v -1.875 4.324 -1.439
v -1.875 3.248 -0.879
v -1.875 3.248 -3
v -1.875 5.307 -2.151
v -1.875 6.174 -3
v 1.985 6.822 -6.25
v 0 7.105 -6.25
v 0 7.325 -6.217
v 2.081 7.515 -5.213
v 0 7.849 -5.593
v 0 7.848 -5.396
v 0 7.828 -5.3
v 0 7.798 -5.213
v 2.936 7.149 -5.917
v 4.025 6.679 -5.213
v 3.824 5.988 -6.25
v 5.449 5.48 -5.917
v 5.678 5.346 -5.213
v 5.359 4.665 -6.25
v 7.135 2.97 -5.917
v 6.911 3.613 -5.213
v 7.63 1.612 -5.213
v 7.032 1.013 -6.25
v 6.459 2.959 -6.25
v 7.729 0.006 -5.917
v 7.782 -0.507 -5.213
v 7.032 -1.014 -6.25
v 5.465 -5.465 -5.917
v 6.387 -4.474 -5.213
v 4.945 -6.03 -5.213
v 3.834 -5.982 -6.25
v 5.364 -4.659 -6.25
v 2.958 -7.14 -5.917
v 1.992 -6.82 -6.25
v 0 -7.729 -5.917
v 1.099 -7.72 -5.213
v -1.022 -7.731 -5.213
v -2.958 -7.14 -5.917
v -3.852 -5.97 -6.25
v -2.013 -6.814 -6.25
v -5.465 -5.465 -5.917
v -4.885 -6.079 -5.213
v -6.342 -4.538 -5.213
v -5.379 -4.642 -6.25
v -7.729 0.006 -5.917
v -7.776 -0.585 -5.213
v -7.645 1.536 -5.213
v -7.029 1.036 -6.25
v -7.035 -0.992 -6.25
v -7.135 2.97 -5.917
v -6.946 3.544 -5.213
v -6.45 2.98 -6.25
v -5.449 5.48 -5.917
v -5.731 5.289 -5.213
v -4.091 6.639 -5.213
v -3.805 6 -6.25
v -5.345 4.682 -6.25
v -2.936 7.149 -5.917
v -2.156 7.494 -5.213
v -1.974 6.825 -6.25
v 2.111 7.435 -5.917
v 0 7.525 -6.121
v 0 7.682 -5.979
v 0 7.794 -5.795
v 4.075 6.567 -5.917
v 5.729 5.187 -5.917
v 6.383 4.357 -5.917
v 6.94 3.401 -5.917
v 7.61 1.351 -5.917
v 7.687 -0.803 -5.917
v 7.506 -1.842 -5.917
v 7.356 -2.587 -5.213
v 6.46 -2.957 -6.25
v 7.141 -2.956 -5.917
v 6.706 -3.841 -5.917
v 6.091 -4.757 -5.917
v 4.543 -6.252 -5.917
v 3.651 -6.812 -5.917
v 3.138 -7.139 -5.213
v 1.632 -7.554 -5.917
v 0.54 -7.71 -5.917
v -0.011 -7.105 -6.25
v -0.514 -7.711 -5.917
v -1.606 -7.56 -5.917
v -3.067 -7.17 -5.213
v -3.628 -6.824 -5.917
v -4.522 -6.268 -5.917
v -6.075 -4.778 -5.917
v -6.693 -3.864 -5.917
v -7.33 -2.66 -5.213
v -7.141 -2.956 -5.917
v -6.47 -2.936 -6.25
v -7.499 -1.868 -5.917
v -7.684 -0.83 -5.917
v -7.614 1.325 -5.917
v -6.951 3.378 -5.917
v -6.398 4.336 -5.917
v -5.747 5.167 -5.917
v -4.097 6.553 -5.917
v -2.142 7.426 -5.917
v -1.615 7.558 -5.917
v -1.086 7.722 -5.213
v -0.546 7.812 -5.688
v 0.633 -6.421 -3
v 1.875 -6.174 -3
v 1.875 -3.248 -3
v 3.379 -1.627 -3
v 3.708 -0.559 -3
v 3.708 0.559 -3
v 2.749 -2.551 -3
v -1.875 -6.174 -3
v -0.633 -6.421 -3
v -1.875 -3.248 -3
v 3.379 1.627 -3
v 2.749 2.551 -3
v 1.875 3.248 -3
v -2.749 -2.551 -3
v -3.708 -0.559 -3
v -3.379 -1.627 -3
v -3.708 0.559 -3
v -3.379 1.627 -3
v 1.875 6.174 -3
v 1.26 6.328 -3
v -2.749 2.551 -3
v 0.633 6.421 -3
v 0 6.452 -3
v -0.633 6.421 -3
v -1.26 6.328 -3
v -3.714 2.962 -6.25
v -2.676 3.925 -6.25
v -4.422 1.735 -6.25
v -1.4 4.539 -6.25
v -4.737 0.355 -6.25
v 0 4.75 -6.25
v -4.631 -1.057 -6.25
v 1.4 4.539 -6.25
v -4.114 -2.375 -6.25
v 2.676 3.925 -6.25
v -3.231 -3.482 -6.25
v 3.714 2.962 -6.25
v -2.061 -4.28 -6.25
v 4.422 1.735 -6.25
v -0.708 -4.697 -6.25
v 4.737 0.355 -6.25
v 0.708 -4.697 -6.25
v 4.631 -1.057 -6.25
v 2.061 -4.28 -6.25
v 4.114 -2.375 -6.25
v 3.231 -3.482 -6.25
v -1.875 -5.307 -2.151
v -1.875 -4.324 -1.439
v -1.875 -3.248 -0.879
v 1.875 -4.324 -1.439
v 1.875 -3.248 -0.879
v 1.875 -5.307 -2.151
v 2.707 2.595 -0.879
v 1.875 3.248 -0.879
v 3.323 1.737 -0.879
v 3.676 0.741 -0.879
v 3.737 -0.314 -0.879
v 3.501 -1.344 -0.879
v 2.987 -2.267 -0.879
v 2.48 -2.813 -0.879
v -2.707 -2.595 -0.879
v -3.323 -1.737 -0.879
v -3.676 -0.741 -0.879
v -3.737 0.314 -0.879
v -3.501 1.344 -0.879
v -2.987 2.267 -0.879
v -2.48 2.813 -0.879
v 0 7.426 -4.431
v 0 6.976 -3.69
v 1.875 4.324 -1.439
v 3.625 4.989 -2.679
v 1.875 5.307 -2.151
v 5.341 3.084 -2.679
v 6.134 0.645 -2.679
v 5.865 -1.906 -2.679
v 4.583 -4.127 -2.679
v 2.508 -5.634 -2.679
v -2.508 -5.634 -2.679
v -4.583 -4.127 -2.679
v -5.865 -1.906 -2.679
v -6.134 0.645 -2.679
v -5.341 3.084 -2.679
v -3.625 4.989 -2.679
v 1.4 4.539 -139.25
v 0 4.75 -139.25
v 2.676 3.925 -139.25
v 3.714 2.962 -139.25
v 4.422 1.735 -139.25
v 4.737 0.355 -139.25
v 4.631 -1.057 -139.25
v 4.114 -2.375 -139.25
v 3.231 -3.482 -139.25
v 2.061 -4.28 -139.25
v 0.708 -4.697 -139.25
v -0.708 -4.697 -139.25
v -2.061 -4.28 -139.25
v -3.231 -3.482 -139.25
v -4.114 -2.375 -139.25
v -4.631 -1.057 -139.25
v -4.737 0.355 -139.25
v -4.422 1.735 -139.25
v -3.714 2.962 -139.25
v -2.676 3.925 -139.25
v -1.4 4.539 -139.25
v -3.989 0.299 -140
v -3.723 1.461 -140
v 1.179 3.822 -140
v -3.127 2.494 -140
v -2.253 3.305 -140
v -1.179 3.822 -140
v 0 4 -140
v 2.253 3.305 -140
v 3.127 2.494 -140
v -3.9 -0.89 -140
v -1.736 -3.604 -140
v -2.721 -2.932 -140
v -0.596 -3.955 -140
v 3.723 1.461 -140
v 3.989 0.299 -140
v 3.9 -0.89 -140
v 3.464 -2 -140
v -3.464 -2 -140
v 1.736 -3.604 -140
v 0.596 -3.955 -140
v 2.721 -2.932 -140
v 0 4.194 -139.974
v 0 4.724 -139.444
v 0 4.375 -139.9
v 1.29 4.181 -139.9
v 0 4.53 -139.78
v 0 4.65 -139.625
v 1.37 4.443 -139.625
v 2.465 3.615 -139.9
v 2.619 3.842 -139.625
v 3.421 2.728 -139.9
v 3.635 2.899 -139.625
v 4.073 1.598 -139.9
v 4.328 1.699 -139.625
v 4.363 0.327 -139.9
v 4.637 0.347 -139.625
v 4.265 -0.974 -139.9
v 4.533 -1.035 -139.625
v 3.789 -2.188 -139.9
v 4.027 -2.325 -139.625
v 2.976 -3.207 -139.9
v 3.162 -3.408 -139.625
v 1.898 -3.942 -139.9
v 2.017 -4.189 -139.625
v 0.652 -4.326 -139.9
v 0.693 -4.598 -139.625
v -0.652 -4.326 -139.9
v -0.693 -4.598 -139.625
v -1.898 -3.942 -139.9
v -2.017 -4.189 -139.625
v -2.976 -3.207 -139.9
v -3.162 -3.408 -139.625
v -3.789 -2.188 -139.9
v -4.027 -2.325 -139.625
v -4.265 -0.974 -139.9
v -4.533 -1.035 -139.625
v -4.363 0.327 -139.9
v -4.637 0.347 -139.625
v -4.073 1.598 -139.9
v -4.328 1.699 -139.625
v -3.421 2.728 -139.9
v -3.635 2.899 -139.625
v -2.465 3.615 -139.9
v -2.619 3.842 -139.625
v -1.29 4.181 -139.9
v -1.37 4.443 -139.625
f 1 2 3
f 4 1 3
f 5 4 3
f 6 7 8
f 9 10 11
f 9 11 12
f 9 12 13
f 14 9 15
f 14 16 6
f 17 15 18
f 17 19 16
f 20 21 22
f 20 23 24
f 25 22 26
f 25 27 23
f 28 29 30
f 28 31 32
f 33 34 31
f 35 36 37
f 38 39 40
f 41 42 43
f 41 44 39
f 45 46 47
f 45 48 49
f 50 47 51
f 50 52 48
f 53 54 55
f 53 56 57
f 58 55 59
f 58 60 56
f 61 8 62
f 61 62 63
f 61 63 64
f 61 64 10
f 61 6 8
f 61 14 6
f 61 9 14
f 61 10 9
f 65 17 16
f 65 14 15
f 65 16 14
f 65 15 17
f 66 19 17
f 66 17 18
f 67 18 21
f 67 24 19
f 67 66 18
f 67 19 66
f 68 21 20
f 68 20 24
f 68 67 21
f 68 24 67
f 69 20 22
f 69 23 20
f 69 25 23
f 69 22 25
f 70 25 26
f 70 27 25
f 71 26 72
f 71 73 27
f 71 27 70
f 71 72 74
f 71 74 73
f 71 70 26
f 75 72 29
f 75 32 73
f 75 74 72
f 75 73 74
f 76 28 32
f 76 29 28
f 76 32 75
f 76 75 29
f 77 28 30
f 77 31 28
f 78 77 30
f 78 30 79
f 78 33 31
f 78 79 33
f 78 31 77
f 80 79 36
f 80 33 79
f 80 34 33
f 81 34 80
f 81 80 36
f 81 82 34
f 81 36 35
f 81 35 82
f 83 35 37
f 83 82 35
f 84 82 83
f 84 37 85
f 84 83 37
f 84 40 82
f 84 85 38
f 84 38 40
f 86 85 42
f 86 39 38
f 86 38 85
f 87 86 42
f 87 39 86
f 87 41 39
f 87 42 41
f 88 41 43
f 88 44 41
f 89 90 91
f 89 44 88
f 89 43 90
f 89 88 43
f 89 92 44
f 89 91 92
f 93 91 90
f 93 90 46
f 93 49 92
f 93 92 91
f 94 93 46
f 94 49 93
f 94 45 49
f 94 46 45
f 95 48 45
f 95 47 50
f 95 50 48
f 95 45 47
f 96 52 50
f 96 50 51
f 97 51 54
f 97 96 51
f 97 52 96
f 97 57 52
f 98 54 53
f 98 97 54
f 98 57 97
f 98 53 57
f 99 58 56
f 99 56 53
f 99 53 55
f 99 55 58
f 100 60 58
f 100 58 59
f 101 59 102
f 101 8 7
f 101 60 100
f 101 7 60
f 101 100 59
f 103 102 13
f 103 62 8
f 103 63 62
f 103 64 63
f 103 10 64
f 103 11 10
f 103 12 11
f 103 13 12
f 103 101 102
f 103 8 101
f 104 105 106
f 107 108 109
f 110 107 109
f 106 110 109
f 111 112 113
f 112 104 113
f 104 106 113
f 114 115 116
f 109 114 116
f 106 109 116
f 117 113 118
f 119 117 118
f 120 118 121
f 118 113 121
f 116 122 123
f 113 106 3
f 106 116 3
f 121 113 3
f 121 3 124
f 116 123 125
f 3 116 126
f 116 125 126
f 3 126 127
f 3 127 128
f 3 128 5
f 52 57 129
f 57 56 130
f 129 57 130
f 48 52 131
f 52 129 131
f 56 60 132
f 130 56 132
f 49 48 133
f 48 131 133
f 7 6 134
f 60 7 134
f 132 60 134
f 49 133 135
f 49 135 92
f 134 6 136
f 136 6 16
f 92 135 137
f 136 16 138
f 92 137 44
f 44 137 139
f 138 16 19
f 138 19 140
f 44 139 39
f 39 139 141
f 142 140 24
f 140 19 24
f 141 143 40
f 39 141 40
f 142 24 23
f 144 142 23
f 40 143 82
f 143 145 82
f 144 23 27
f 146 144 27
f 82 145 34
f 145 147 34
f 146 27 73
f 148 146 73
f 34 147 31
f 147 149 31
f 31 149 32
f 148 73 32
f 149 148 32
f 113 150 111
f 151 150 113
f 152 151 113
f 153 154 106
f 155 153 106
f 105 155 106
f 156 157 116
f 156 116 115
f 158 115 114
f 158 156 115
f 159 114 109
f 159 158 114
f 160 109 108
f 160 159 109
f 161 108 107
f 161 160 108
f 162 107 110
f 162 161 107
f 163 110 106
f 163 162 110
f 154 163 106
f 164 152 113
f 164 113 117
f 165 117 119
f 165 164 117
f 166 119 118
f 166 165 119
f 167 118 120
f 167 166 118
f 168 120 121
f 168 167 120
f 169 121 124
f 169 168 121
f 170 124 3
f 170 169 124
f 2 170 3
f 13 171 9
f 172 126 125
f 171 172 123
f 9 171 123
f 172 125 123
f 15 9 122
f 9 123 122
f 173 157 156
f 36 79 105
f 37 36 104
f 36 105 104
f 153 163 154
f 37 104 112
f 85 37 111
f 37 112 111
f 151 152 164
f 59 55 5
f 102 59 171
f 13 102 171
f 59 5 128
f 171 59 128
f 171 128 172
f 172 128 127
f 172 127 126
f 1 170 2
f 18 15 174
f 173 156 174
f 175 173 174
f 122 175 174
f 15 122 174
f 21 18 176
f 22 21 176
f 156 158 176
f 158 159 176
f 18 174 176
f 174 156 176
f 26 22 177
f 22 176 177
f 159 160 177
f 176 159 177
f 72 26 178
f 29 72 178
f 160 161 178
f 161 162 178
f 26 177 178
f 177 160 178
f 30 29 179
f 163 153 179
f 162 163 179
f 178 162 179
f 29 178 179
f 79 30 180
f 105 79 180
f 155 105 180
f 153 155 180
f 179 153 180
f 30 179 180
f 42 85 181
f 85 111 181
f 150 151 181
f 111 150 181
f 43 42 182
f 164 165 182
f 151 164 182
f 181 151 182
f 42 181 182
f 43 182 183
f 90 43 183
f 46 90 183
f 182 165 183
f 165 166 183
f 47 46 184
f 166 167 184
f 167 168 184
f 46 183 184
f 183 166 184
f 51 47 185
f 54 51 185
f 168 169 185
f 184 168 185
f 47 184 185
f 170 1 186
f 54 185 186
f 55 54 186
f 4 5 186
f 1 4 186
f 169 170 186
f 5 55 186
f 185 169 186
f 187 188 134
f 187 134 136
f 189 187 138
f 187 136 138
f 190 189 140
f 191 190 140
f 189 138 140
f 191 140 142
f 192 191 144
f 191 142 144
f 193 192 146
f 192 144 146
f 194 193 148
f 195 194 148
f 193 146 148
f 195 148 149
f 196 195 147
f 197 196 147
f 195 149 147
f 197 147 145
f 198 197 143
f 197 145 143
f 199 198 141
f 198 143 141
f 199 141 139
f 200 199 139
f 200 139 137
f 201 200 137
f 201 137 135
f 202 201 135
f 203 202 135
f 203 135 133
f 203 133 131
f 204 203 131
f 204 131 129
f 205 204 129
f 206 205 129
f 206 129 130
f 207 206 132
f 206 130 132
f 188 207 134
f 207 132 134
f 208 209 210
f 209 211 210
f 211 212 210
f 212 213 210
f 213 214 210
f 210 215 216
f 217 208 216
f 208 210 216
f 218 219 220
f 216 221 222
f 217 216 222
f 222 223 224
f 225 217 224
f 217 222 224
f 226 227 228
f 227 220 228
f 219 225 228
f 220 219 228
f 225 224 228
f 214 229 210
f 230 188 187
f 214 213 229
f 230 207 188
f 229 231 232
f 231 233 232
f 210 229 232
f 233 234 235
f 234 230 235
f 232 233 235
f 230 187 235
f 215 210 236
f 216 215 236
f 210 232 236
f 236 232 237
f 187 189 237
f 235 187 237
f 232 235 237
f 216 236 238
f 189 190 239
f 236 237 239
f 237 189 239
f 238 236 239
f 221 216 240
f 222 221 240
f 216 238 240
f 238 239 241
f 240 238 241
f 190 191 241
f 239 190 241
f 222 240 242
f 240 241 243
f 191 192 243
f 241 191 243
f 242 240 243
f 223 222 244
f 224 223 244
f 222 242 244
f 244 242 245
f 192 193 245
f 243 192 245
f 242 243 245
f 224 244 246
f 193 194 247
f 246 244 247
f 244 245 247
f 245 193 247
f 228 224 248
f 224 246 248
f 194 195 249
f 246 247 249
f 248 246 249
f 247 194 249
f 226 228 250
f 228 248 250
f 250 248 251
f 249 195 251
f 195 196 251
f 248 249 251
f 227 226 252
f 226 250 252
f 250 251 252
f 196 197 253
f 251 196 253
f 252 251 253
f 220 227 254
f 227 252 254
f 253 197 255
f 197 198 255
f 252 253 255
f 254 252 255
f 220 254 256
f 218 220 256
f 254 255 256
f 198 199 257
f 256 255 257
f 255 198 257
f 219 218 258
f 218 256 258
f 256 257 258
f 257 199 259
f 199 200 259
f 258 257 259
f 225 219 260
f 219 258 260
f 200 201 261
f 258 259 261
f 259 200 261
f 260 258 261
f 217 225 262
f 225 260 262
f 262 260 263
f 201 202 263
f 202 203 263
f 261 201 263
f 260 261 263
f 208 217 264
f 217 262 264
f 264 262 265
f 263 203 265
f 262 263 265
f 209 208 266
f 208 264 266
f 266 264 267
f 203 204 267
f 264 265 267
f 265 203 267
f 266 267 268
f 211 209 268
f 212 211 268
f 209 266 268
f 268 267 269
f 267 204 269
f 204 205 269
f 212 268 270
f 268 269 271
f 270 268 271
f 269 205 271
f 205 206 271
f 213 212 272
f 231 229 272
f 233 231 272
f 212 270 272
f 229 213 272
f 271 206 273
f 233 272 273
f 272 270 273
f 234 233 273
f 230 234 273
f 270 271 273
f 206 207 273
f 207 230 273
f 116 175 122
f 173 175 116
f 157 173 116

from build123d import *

# Parameters (mm, degrees)
FILLET1_R          = 0.75
CUT_EXTRUDE6_DEPTH = 3


with BuildPart() as part:
    # Sketch1 → Revolve1 (revolve)
    with BuildSketch(Plane(origin=(0, 0, 0), x_dir=(0, 0, -1), z_dir=(1, 0, 0))):
        with BuildLine():
            Line((0, 0), (140, 0))
            Line((140, 0), (140, 4.75))
            Line((140, 4.75), (6.25, 4.75))
            Line((6.25, 4.75), (6.25, 8.15))
            ThreePointArc((6.25, 8.15), (1.742375921, 5.135294539), (0, 0))
        make_face()
    revolve(axis=Axis((0, 0, 0), (0, 0, -1)))

    # Fillet1
    fillet1_edges = [part.edges().sort_by_distance(p)[0] for p in [
        (0, -8.15, -6.25),
        (0, -4.75, -140),
    ]]
    fillet(fillet1_edges, radius=FILLET1_R)

    # Sketch4 → Cut-Extrude6 (cut)
    with BuildSketch(Plane.XY):
        with BuildLine():
            Line((1.875, -3.247595264), (1.875, -9.329244328))
            Line((1.875, -9.329244328), (-1.875, -9.329244328))
            Line((-1.875, -9.329244328), (-1.875, -3.247595264))
            ThreePointArc((-1.875, -3.247595264), (-3.75, 0), (-1.875, 3.247595264))
            Line((-1.875, 3.247595264), (-1.875, 9.329244328))
            Line((-1.875, 9.329244328), (1.875, 9.329244328))
            Line((1.875, 9.329244328), (1.875, 3.247595264))
            ThreePointArc((1.875, 3.247595264), (3.75, 0), (1.875, -3.247595264))
        make_face()
    extrude(amount=-CUT_EXTRUDE6_DEPTH, mode=Mode.SUBTRACT)


solid = part.part
